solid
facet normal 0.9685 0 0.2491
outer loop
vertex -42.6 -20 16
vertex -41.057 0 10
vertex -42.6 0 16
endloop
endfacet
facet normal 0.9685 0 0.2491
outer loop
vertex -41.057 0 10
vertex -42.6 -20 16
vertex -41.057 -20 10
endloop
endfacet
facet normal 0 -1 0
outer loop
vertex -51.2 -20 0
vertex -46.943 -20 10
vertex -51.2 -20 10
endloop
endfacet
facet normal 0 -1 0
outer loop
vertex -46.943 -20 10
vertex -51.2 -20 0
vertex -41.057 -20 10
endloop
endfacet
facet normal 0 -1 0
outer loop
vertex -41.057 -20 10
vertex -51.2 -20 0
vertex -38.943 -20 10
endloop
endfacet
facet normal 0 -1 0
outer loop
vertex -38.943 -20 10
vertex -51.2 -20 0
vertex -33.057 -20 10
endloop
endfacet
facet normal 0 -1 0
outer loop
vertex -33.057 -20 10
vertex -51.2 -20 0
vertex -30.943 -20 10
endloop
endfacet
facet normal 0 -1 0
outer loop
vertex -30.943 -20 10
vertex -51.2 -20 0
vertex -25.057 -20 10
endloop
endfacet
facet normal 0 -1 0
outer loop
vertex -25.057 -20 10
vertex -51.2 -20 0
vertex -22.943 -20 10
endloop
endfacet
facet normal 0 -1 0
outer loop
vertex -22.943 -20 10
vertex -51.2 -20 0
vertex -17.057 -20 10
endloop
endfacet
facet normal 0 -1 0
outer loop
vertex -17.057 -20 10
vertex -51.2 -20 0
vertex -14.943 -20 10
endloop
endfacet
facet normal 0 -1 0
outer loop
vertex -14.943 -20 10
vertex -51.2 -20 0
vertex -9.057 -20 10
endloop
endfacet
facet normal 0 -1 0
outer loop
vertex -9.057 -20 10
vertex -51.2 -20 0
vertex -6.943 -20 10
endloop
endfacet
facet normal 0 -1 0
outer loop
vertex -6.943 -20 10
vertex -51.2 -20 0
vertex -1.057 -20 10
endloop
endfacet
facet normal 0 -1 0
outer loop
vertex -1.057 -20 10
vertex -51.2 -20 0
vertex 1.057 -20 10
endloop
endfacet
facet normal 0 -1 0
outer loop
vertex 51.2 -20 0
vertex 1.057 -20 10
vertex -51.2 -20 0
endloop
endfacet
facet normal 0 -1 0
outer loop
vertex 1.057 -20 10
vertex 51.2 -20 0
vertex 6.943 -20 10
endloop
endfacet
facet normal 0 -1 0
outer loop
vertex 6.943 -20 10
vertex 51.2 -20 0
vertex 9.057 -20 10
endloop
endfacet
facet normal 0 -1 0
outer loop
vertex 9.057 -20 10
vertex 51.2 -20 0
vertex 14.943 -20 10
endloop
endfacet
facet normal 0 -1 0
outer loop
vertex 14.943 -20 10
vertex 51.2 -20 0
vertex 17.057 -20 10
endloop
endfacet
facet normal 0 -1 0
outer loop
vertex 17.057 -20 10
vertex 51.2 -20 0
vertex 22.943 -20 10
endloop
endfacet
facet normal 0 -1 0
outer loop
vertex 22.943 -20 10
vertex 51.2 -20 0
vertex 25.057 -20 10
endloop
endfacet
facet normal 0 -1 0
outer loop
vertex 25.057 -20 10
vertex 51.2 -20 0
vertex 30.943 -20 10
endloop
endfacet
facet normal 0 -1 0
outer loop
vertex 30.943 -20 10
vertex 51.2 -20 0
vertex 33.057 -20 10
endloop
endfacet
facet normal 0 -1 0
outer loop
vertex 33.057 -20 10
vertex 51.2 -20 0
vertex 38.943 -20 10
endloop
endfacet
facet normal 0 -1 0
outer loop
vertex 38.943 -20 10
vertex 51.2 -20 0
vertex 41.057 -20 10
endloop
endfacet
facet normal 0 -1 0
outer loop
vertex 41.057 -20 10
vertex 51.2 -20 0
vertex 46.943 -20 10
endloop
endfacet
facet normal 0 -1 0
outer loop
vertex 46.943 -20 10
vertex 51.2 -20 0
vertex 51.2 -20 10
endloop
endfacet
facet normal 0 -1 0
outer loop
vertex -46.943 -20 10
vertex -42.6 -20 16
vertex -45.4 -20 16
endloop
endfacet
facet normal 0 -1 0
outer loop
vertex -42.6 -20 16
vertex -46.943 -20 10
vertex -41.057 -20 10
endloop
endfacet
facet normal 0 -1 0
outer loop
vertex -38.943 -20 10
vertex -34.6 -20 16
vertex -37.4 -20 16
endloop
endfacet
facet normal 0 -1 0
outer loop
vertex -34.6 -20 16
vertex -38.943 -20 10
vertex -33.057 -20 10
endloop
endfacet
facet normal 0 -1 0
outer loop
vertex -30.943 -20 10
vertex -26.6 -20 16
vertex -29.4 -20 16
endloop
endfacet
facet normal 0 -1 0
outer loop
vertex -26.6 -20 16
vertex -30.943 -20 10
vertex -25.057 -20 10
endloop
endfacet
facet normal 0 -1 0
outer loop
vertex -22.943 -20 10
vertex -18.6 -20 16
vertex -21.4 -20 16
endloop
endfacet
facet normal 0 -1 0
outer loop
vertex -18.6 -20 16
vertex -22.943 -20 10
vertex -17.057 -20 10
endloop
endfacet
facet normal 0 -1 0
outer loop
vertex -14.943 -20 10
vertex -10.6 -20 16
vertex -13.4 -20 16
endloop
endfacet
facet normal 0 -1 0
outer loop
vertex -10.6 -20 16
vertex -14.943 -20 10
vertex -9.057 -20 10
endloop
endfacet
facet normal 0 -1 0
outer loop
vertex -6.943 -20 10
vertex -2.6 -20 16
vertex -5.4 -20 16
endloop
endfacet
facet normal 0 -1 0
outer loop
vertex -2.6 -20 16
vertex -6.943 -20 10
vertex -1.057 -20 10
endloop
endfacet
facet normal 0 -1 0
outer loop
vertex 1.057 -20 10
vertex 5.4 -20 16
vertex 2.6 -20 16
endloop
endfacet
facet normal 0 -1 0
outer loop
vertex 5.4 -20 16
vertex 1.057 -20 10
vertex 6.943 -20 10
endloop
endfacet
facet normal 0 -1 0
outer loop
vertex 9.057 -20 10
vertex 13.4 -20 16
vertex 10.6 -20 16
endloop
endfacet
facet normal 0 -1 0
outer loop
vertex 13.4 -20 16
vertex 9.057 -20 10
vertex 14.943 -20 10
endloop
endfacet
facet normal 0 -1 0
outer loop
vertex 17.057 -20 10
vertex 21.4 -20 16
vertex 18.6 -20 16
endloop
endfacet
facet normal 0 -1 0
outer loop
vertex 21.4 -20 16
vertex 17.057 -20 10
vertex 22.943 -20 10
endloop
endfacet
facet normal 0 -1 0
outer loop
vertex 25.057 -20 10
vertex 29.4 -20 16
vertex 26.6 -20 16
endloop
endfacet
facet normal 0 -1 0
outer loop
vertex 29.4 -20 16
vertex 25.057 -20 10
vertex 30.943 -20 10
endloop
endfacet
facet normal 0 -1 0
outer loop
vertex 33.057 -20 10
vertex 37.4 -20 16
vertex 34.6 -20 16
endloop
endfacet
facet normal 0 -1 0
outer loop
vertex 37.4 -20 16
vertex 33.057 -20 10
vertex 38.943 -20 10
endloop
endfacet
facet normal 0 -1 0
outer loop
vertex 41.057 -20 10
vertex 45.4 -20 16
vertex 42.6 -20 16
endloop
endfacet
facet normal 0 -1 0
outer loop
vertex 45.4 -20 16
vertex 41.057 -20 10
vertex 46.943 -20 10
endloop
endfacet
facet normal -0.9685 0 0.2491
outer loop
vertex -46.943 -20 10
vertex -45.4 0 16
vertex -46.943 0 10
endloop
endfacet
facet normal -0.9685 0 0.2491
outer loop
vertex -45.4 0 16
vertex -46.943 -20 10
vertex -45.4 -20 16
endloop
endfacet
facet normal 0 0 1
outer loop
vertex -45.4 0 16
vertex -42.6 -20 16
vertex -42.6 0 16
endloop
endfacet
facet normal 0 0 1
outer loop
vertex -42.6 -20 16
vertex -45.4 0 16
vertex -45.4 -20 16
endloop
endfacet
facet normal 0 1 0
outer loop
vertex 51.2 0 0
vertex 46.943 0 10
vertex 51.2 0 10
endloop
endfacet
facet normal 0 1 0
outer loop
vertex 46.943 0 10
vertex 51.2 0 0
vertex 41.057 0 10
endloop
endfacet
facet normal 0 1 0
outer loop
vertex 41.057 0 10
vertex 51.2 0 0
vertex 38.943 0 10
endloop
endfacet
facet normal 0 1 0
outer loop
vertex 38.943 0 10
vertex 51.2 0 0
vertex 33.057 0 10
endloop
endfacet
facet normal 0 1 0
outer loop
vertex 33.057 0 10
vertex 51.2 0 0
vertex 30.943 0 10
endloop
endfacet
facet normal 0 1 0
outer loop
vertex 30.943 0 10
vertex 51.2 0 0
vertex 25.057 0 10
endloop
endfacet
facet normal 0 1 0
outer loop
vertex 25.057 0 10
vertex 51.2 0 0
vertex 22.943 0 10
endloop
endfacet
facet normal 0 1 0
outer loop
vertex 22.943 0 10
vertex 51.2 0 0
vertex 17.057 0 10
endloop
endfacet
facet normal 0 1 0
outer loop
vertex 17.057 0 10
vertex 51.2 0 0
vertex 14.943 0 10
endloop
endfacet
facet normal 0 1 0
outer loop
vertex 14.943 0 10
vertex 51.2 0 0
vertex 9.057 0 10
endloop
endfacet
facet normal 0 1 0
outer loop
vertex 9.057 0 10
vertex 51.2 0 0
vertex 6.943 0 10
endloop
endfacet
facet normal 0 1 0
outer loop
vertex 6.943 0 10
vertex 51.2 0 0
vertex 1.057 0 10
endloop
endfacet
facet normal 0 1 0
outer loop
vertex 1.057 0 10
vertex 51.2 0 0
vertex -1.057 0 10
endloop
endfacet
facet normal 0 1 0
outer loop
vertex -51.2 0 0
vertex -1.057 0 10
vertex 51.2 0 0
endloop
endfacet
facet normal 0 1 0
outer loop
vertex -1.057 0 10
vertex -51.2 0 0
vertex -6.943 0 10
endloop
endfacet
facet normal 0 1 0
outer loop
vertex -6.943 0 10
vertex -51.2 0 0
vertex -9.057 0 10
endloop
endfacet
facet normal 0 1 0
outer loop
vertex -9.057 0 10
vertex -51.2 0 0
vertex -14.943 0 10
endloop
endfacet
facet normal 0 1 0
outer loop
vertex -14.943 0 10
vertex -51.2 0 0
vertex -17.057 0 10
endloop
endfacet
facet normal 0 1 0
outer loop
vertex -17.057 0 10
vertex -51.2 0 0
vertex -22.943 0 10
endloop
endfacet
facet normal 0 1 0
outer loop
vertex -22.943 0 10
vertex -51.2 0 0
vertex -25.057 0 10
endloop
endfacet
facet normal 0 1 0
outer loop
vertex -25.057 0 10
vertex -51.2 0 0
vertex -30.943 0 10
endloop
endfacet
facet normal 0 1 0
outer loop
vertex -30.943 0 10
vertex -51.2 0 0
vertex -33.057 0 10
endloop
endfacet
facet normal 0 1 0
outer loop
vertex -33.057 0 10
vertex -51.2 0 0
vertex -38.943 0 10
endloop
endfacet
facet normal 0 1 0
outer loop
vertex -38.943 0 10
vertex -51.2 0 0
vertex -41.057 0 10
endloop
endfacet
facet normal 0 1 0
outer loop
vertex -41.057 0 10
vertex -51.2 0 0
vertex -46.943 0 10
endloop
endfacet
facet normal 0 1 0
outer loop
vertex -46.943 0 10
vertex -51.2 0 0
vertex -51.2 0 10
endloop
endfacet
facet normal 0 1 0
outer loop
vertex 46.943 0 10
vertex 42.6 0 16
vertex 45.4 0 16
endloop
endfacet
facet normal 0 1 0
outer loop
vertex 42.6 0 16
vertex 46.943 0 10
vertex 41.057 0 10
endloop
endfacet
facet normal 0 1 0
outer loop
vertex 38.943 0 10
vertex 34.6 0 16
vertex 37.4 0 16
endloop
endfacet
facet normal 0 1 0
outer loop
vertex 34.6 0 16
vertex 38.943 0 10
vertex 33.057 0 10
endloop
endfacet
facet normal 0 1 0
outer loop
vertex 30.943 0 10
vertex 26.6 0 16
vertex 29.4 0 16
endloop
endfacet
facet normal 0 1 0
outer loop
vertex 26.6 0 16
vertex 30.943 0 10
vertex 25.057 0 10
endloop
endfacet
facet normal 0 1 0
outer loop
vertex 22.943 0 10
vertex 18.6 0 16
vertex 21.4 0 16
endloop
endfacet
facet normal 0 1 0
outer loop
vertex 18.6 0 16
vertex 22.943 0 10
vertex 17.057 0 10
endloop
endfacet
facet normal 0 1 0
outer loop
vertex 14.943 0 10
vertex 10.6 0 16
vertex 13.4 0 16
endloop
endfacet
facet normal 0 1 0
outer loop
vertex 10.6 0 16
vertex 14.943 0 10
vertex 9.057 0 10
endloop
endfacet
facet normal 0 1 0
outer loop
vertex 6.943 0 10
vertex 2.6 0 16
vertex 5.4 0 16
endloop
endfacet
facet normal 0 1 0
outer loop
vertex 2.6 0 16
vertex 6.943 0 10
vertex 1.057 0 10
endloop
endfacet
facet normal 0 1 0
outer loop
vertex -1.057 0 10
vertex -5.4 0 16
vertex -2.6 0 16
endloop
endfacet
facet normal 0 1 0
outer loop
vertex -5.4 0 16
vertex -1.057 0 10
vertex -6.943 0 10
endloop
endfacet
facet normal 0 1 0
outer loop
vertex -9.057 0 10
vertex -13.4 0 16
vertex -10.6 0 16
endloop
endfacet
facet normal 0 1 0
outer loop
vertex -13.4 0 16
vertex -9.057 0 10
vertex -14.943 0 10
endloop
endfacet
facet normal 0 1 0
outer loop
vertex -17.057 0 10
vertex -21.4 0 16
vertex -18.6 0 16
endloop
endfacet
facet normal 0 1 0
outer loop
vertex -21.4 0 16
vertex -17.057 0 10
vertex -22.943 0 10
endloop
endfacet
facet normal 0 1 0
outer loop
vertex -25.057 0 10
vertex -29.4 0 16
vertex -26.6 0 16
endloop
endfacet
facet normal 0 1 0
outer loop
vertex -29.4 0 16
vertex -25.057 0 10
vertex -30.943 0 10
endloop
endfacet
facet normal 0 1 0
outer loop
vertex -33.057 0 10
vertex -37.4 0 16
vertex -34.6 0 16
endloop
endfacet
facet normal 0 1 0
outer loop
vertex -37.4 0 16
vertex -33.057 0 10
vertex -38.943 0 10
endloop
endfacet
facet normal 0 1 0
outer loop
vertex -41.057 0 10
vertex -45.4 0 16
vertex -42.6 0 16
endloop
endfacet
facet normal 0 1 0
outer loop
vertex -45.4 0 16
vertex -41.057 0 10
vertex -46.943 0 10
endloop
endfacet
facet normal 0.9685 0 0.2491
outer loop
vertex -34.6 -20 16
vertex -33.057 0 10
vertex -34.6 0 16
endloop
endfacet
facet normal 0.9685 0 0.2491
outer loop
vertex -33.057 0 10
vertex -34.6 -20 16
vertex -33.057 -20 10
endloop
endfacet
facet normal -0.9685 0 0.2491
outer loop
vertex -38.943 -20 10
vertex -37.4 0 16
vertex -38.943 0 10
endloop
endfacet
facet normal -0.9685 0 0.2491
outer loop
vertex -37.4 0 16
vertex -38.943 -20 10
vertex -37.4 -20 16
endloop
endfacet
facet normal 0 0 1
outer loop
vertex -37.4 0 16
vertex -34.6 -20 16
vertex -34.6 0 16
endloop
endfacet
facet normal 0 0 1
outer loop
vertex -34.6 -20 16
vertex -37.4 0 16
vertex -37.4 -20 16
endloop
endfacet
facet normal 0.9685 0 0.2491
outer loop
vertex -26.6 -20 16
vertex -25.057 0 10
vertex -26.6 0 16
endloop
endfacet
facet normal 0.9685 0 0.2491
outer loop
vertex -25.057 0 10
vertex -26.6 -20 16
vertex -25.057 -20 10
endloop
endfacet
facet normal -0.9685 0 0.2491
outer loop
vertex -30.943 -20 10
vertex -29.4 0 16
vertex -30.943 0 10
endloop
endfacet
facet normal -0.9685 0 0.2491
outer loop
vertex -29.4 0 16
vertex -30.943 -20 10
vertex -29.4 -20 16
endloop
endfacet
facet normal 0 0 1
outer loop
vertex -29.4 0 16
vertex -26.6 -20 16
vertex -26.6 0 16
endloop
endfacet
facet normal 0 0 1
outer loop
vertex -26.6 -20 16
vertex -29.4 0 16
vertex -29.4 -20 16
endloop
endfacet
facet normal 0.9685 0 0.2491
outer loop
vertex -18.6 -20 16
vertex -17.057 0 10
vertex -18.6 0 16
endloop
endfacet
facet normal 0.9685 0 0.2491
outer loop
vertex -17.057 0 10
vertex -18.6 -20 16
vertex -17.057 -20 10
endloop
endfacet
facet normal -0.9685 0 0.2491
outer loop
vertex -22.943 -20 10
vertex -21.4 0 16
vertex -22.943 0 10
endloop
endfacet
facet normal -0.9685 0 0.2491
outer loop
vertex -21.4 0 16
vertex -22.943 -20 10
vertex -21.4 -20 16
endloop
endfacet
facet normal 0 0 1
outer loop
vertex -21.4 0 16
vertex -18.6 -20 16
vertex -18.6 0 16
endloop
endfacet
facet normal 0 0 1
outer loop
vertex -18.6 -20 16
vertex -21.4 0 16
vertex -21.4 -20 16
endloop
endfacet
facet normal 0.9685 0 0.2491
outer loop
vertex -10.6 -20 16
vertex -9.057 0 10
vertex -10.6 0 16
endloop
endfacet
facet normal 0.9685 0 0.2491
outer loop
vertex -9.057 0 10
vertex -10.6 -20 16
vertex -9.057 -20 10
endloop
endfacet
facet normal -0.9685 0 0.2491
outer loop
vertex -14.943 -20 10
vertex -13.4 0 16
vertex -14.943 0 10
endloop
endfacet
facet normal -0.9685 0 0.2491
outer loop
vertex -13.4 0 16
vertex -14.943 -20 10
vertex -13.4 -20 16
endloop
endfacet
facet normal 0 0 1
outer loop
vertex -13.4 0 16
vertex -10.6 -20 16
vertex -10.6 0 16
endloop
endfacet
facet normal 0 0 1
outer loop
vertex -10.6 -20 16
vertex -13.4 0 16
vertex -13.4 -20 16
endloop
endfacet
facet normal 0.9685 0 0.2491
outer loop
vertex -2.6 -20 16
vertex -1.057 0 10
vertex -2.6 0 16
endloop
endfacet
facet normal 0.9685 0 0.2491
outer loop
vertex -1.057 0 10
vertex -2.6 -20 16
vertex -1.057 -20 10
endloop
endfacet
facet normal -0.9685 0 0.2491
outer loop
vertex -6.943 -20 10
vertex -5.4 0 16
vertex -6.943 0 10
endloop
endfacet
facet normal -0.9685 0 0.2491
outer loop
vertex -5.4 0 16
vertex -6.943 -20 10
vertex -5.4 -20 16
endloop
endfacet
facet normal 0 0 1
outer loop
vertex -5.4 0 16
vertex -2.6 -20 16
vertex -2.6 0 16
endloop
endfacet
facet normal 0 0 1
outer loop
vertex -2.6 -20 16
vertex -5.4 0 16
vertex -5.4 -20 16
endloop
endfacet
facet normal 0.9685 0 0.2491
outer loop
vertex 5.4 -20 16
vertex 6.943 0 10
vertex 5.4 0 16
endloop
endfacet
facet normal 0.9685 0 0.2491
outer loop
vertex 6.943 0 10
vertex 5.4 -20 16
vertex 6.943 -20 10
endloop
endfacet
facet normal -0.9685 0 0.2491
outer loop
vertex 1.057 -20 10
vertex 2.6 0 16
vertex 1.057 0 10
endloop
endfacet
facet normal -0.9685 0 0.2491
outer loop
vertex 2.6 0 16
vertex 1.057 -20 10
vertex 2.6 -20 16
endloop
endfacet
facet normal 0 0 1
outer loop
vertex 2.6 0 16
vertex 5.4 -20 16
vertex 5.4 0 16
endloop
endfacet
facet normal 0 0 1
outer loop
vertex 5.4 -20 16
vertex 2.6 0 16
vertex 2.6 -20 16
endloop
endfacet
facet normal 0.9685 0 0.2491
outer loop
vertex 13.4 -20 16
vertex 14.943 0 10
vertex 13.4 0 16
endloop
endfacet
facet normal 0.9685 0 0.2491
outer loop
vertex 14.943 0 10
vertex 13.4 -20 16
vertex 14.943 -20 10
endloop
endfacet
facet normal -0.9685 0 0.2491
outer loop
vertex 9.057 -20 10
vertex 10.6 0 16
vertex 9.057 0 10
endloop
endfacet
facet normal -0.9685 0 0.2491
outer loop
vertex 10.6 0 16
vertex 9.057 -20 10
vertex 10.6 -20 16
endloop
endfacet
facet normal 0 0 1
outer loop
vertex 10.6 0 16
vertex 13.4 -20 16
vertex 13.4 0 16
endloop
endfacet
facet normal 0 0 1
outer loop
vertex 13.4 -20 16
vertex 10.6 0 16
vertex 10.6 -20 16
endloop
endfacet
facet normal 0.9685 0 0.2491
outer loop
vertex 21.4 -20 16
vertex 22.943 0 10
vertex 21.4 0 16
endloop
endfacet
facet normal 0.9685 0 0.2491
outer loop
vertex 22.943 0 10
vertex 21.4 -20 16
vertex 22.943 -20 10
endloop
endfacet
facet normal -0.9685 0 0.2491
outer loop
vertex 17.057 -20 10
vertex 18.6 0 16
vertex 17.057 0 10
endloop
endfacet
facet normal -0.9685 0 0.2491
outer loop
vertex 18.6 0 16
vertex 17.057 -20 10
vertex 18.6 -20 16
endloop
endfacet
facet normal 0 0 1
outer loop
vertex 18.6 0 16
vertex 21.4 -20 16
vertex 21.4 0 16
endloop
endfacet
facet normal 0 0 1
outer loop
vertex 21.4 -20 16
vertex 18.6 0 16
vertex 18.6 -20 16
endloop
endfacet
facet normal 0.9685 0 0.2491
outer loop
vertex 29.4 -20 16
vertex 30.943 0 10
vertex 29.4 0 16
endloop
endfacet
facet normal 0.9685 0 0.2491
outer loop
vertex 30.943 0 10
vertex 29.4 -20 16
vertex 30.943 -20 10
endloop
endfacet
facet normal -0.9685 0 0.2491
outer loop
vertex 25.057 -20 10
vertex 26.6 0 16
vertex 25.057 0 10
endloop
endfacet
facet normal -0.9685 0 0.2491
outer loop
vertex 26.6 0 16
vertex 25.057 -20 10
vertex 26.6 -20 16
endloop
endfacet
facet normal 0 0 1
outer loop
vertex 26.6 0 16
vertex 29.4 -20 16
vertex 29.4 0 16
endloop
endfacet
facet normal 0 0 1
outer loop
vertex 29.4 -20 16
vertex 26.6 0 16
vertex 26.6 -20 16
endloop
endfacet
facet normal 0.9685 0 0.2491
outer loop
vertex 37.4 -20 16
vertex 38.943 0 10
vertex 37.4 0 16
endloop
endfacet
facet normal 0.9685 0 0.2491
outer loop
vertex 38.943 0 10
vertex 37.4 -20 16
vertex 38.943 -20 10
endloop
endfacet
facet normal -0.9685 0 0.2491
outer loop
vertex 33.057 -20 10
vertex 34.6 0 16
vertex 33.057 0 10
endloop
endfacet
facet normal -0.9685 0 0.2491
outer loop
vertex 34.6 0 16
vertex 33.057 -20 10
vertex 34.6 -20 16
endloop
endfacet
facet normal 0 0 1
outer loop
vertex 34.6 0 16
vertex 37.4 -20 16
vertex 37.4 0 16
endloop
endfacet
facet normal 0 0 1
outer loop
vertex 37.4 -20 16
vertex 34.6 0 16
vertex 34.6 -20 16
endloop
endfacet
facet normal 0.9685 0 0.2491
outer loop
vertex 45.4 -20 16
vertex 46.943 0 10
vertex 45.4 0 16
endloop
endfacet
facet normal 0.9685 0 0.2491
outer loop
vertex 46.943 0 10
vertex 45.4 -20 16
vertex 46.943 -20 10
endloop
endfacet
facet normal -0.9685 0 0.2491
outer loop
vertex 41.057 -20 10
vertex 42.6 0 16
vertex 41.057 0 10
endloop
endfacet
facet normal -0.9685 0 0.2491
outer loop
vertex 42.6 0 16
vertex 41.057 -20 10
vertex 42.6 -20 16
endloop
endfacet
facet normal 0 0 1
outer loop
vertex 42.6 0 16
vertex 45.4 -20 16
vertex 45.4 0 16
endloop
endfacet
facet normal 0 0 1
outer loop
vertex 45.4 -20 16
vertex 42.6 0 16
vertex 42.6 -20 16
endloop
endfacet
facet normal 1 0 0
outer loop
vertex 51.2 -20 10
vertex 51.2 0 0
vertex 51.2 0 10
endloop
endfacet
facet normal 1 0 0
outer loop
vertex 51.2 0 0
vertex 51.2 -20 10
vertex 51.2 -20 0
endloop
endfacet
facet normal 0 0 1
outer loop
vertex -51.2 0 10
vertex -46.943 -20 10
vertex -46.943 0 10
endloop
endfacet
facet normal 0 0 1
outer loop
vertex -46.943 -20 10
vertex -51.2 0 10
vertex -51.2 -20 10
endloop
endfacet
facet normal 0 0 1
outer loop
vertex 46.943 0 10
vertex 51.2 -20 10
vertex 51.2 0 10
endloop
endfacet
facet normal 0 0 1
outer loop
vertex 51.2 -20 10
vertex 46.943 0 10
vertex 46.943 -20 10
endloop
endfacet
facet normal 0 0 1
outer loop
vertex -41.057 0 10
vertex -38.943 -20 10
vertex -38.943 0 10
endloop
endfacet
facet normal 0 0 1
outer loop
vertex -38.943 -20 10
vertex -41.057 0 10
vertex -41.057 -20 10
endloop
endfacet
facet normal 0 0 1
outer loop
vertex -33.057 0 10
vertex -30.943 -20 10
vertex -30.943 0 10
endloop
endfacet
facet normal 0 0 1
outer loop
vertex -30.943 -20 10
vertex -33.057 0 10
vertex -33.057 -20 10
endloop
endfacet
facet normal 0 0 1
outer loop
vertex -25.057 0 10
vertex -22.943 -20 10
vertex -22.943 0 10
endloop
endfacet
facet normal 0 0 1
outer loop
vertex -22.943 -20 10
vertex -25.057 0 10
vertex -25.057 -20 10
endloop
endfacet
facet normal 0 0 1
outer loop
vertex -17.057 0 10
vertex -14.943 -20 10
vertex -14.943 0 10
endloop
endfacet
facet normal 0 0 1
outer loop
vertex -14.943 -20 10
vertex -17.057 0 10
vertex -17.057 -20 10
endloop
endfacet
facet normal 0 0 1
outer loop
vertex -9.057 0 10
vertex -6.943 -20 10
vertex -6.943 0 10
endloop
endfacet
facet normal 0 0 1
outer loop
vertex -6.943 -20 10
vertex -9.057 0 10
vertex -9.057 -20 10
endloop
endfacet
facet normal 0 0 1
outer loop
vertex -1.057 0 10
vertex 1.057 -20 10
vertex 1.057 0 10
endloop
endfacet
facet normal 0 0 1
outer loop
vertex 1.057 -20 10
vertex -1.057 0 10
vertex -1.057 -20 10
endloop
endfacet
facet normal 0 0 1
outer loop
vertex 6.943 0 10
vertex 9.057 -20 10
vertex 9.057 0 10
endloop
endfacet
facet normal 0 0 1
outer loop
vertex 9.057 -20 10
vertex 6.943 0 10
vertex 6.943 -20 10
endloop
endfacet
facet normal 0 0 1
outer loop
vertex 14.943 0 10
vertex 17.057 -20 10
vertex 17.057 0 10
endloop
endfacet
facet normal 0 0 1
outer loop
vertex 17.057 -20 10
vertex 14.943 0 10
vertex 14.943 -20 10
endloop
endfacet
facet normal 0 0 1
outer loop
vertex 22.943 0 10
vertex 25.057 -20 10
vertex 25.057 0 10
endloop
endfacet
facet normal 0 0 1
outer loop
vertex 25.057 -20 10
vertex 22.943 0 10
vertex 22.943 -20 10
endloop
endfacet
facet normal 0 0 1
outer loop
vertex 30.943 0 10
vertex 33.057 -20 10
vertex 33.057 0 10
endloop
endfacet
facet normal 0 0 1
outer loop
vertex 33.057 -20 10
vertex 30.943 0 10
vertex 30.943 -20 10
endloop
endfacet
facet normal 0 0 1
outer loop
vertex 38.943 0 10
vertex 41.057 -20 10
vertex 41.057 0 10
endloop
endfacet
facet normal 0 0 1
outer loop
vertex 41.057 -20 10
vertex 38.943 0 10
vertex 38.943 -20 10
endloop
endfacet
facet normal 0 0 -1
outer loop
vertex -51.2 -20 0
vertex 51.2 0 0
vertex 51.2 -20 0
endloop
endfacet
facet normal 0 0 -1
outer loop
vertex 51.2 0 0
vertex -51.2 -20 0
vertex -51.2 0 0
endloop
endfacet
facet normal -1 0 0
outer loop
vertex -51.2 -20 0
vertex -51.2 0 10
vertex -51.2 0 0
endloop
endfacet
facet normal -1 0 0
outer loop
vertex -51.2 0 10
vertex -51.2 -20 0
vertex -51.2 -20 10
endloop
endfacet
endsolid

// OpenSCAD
$fn = 32;

// ----------------------------------------------------------------------
// Toothed rack, 12 teeth
// 8 mm pitch, 6 mm teeth
// ----------------------------------------------------------------------

// --- parameters (mm) ---
bar_w = 20;     // bar width (Y)
bar_h = 10;     // bar height (Z)
teeth = 12;     // number of teeth
pitch = 8;      // tooth pitch
tooth_h = 6;    // tooth height above the bar
root_w = 6.4;   // tooth width at the root
crest_w = 2.8;  // tooth width at the crest

// --- derived feature positions (mm) ---
span = (teeth - 1) * pitch;  // = 88   distance between the outer teeth
bar_l = span + root_w + 8;   // = 102.4   bar length: teeth plus 4 mm at each end
tooth_x = -span / 2;         // = -44   X of the first tooth
height = bar_h + tooth_h;    // = 16   overall height
feature_centers = [
  [tooth_x + 0 * pitch, -bar_w / 2],
  [tooth_x + 1 * pitch, -bar_w / 2],
  [tooth_x + 2 * pitch, -bar_w / 2],
  [tooth_x + 3 * pitch, -bar_w / 2],
  [tooth_x + 4 * pitch, -bar_w / 2],
  [tooth_x + 5 * pitch, -bar_w / 2],
  [tooth_x + 6 * pitch, -bar_w / 2],
  [tooth_x + 7 * pitch, -bar_w / 2],
  [tooth_x + 8 * pitch, -bar_w / 2],
  [tooth_x + 9 * pitch, -bar_w / 2],
  [tooth_x + 10 * pitch, -bar_w / 2],
  [tooth_x + 11 * pitch, -bar_w / 2]
];   // tooth centre line, drives the tooth loop

// bar with a rack of teeth, one extruded trapezoium per centre
module rack_tooth() {
  linear_extrude(height = bar_w)
    polygon(points = [
      [0, 0],
      [root_w, 0],
      [root_w / 2 + crest_w / 2, tooth_h + 1],
      [root_w / 2 - crest_w / 2, tooth_h + 1]
    ]);
}

union() {
  translate([-bar_l / 2, -bar_w, 0]) cube([bar_l, bar_w, bar_h]);
  for (centre = feature_centers)
    translate([centre[0] - root_w / 2, 0, bar_h - 1]) rotate([90, 0, 0]) rack_tooth();
}
